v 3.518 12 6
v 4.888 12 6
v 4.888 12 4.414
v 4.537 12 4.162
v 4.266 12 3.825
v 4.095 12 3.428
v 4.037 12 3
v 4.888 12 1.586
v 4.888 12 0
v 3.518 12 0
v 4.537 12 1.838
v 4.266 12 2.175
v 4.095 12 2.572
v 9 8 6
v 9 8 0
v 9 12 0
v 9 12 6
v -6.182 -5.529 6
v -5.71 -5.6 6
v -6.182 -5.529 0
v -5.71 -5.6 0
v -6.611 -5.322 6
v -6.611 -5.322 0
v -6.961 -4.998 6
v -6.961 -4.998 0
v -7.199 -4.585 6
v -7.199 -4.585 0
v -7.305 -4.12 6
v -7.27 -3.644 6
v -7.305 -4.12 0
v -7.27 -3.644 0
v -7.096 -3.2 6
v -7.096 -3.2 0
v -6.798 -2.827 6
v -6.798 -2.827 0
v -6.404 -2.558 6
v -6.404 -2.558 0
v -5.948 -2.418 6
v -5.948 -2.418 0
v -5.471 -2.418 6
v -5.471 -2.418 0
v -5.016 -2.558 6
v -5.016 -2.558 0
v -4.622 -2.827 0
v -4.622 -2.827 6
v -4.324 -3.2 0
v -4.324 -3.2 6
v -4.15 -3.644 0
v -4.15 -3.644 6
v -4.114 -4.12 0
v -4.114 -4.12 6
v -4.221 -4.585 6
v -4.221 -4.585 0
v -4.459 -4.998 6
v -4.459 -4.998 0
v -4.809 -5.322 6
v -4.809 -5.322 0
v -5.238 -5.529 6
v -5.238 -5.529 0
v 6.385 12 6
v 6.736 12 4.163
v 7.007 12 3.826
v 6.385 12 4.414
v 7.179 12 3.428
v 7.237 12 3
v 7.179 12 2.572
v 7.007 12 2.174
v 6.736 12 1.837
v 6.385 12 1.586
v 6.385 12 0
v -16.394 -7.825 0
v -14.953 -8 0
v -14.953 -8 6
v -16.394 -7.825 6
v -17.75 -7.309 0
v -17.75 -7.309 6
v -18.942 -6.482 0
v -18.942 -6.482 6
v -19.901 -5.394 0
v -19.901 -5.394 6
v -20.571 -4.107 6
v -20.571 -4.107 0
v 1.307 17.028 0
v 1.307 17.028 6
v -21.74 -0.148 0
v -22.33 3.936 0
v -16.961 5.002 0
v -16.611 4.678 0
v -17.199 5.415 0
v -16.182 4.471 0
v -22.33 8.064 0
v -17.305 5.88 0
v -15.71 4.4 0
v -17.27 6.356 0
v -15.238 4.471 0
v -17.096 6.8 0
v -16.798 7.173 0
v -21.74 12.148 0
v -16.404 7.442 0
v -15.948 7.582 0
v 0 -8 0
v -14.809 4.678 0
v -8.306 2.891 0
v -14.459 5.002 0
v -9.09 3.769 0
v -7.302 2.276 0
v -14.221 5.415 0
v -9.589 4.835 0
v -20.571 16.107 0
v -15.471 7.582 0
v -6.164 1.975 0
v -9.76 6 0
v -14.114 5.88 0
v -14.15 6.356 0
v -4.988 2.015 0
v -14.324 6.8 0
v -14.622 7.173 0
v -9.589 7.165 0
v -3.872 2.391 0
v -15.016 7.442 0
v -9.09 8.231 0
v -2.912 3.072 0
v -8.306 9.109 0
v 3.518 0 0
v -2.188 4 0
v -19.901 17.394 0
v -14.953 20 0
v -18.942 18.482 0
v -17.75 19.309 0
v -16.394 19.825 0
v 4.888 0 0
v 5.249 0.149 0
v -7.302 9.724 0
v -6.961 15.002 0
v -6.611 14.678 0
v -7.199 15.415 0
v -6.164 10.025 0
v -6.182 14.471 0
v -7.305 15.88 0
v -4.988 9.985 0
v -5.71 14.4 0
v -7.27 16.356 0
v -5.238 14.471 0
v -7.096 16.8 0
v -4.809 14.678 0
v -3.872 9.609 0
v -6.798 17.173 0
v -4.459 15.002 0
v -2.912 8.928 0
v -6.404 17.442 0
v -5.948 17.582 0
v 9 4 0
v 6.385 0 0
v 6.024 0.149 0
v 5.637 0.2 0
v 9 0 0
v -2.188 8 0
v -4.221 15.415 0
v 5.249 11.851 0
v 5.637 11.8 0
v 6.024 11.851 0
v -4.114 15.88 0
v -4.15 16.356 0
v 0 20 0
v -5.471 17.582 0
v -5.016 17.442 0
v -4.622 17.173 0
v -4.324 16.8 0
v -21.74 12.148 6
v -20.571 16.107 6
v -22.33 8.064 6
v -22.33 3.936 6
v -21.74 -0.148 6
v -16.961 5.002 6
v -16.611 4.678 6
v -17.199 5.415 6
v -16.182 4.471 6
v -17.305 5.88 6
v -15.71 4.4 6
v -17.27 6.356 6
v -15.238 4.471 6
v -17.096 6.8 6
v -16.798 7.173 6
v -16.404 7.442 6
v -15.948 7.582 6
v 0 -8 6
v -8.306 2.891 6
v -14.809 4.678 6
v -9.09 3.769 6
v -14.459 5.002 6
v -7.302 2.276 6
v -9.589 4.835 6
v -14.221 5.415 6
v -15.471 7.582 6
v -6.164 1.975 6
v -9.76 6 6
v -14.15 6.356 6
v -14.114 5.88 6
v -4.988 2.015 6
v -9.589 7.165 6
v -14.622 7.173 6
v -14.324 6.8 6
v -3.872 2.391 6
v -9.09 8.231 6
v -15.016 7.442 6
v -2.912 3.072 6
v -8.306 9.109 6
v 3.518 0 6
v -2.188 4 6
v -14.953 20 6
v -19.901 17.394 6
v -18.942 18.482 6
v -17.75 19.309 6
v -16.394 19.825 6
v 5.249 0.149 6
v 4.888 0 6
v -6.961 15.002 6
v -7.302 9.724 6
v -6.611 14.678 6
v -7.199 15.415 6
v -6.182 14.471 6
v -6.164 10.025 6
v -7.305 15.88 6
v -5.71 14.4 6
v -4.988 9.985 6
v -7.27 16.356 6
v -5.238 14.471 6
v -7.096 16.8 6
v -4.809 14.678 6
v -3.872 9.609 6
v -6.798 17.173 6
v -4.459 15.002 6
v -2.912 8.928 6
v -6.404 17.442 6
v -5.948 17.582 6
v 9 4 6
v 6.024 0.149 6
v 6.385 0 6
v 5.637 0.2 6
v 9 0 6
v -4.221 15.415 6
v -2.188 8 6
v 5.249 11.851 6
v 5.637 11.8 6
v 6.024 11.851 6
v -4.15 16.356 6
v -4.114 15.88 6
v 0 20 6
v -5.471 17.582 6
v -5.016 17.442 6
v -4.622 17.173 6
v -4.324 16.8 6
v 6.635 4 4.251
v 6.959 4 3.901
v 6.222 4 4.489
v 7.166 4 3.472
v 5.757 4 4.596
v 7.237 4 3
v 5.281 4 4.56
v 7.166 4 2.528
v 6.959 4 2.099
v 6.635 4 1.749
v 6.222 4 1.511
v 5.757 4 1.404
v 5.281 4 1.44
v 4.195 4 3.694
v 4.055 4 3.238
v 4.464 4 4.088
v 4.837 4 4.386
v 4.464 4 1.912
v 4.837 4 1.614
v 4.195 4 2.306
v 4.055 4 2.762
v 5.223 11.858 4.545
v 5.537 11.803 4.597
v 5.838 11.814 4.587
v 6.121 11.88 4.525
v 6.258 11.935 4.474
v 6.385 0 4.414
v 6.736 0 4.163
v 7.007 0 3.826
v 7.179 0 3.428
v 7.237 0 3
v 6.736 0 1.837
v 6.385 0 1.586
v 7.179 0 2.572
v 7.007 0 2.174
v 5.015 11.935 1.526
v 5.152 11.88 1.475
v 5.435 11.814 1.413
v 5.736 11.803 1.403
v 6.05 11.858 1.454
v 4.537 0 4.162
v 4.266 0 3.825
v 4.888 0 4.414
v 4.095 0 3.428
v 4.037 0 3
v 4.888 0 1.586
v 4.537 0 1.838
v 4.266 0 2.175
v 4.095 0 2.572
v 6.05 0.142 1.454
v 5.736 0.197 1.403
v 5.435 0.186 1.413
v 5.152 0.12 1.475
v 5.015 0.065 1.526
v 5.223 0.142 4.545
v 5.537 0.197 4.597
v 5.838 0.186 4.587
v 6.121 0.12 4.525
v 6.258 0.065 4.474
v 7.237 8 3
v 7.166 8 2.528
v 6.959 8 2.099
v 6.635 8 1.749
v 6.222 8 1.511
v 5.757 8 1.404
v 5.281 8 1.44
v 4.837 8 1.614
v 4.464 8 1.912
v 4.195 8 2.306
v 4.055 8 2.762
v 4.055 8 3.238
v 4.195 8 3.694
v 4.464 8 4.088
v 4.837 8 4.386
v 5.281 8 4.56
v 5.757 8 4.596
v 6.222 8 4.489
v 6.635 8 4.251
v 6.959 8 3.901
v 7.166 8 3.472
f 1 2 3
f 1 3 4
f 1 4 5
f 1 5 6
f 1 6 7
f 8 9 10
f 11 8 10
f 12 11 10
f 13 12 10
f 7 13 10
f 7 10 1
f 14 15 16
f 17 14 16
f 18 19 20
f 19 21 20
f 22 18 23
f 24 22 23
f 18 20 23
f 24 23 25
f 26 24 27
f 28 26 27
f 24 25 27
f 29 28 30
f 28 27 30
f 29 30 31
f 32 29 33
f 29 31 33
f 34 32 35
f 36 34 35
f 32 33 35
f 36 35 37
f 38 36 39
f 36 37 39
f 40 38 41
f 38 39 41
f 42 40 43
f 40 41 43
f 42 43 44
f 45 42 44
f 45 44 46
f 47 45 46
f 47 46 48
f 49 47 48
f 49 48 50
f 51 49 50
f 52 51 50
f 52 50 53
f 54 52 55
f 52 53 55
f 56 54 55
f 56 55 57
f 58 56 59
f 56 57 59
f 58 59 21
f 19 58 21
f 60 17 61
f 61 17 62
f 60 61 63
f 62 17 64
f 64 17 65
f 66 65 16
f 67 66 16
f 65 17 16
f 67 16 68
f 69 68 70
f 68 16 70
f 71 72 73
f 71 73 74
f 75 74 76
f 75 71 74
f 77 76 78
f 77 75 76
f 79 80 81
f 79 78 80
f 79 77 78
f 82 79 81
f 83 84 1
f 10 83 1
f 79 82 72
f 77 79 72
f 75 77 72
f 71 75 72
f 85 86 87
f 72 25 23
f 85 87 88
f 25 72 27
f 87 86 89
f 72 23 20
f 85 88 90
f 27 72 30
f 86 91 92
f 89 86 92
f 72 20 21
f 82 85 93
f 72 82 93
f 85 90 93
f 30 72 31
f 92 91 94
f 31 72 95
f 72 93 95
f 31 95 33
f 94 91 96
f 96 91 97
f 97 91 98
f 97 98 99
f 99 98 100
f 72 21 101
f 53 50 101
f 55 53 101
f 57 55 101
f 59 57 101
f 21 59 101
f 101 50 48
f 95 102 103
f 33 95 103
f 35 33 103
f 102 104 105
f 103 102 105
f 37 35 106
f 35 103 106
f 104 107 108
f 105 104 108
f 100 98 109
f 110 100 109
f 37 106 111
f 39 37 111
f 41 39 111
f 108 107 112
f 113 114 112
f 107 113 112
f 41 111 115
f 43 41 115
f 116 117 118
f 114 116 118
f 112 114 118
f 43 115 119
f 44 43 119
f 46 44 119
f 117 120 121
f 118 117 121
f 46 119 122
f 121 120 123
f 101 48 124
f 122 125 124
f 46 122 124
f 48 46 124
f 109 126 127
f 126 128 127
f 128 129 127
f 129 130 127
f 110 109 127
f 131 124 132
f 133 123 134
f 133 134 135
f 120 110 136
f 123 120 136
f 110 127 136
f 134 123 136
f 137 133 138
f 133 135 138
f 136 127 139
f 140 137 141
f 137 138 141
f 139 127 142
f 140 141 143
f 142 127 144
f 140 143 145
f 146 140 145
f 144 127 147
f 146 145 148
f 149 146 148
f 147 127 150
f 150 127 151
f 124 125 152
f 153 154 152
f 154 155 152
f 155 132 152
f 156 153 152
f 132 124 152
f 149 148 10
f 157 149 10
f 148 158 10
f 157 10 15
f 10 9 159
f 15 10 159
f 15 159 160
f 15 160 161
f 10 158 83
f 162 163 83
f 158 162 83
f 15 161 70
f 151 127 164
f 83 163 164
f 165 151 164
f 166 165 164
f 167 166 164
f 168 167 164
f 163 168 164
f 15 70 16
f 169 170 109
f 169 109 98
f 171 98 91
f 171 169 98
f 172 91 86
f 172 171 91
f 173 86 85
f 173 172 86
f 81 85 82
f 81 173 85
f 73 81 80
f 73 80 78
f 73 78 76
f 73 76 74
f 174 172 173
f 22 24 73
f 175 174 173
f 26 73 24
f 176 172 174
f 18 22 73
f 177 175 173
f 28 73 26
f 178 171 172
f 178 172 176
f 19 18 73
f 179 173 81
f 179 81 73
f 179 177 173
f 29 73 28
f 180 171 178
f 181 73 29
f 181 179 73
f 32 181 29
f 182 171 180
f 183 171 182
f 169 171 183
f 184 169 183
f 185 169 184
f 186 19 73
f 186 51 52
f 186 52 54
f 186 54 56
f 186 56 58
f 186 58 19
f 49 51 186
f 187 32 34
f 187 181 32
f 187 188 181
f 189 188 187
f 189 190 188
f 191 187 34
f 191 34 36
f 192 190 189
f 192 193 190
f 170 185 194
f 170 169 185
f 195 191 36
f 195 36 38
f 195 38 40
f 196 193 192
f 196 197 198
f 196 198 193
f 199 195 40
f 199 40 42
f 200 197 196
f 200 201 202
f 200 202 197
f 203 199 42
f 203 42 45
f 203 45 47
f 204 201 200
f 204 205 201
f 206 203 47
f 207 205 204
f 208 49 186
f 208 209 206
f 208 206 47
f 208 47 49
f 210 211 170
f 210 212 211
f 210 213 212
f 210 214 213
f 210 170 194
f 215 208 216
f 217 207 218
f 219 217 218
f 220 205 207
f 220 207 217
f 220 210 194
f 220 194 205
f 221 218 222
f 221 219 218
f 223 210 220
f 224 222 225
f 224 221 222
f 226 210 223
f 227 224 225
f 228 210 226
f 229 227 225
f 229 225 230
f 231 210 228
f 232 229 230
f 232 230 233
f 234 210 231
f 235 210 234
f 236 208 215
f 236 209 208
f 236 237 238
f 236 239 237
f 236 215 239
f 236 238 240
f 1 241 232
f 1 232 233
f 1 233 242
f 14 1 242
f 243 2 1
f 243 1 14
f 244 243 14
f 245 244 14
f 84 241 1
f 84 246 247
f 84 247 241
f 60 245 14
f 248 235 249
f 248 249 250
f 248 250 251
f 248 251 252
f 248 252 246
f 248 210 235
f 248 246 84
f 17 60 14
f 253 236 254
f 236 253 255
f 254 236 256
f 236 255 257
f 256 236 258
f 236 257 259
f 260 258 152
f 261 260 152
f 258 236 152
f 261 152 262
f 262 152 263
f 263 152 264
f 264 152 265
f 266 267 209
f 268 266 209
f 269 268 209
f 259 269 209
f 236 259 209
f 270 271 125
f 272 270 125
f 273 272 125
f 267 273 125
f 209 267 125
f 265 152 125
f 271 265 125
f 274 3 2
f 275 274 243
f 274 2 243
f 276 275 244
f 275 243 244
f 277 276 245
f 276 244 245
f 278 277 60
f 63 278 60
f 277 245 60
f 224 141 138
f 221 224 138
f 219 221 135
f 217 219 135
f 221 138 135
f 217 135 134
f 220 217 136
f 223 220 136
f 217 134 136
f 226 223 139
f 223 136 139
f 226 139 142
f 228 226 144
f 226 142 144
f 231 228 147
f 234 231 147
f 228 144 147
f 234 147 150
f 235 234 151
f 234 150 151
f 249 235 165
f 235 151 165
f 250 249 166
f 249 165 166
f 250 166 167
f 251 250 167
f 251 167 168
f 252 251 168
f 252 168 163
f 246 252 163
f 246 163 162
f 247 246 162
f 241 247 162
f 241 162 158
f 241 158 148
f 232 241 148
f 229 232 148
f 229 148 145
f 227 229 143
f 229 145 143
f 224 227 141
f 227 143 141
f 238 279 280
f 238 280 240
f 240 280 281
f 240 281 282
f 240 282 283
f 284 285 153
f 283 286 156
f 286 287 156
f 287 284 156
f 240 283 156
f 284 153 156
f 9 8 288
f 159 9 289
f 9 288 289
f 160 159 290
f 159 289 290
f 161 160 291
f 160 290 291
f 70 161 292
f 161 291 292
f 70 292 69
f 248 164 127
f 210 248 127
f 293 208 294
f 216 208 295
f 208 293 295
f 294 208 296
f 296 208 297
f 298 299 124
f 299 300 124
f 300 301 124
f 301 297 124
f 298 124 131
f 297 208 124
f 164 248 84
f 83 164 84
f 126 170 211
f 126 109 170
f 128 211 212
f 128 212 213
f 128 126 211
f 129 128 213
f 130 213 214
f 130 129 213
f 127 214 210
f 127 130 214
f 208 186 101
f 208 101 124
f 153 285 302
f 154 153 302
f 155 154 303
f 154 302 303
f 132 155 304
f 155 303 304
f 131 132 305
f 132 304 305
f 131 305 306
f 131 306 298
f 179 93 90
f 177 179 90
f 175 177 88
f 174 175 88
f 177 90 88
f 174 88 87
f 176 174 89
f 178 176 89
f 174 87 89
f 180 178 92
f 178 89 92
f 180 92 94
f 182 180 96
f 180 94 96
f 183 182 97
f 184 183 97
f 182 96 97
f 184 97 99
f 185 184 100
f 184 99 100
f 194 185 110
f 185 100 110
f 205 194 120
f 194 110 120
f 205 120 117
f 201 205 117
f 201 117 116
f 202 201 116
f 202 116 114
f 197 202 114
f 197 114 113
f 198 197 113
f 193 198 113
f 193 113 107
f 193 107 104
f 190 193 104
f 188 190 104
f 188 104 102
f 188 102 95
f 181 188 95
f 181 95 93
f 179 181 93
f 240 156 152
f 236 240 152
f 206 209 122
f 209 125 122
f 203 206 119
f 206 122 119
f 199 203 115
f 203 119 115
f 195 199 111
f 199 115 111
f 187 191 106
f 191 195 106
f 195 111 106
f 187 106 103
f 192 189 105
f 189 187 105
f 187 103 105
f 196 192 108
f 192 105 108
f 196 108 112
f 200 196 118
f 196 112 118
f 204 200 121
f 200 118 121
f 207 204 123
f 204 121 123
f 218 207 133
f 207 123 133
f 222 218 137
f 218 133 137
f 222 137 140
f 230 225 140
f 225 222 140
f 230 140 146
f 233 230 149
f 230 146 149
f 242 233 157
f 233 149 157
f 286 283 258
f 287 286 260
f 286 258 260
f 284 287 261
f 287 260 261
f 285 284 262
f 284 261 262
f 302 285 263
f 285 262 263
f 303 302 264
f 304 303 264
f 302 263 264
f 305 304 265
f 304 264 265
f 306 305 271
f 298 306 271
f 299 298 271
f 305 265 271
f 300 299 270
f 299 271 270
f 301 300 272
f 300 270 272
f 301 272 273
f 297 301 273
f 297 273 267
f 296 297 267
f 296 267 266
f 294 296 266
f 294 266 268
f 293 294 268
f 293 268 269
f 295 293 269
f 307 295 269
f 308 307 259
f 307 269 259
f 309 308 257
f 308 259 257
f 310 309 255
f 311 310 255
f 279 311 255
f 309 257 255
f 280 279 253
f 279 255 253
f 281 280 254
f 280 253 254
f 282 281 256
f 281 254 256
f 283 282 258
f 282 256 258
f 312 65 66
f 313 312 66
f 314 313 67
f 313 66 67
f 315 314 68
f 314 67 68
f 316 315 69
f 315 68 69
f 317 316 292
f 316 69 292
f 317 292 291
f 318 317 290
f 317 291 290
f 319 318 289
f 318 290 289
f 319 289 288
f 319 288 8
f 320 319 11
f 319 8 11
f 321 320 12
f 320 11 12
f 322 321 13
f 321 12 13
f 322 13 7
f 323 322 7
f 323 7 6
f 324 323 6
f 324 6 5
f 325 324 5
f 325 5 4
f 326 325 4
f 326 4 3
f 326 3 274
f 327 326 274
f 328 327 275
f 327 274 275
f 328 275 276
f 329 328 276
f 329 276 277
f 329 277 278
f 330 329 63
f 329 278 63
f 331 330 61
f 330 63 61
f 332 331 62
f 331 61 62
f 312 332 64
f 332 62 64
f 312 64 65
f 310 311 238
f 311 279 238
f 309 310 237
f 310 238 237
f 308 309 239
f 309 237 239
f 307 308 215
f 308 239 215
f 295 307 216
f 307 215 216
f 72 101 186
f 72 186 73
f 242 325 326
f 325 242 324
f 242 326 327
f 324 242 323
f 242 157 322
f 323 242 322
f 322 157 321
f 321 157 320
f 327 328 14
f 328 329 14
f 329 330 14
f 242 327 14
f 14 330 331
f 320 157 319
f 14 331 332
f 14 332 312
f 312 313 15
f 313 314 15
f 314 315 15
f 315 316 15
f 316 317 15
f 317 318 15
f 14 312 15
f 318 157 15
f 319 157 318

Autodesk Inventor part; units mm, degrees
ref_plane "YZ Plane" through (0, 0, 0) normal (1, 0, 0) x (0, 1, 0)
ref_plane "XZ Plane" through (0, 0, 0) normal (0, 1, 0) x (-1, 0, 0)
ref_plane "XY Plane" through (0, 0, 0) normal (0, 0, 1) x (1, 0, 0)
sketch "スケッチ1" plane through (0, 0, 0) normal (0, 0, 1) x (1, 0, 0)
  line L0 (9, 0) -> (9, 4)
  line L1 (9, 12) -> (2.2731, 12)
  line L2 (0, 8) -> (9, 8)
  line L3 (0, 4) -> (9, 4)
  line L4 (9, 8) -> (9, 12)
  line L5 (2.2731, 12) -> (0, 14.2779)
  line L6 (2.2731, 0) -> (-5.7099, -8)
  line L7 (-5.7099, 20) -> (-15.7099, 20)
  line L8 (-5.7099, -8) -> (-15.7099, -8)
  line L9 (-15.7099, 20) -> (-25.7698, 20)
  line L10 (-25.7698, 20) -> (-25.7698, -8)
  line L11 (-25.7698, -8) -> (-15.7099, -8)
  line L12 (2.2731, 0) -> (9, 0)
  line L13 (0, 14.2779) -> (-5.7099, 20)
  arc A0 (-2.1881, 8) -> (-2.1881, 4) centre (-5.7099, 6) ccw
  line L14 (0, 8) -> (-2.1881, 8)
  line L15 (0, 4) -> (-2.1881, 4)
  point P0 (0, 0)
  point P1 (4.5, 12)
  point P2 (4.5, 0)
  point P3 (4.5, 4)
  point P4 (-25.7099, 6)
  dimension "d5" = 4
  dimension "d8" = 10
  dimension "d9" = 10
  dimension "d12" = 14
  dimension "d90" = 8.1
extrude "押し出し1" add sketch "スケッチ1" along normal blind 6
sketch "スケッチ2" plane through (0, 0, 6) normal (0, 0, 1) x (1, 0, 0)
  circle A0 centre (5.6365, 13.3) radius 1.5
  line L0 (9, 8) -> (9, 12) projected
  line L1 (11.5477, 6) -> (-28.1936, 6) construction
  line L2 (9, 12) -> (2.2731, 12) projected
  circle A1 centre (5.6365, -1.3) radius 1.5
  point P0 (0, 0)
  point P1 (4.8882, 12)
  point P2 (6.3849, 12)
  dimension "d15" = 3
  dimension "d16" = 3.3635
  dimension "d17" = 1.3
extrude "押し出し2" cut sketch "スケッチ2" against normal blind 6 contours A0 L2 | A1 picked at (5.4614, 13.0013)
sketch "スケッチ3" plane through (0, 0, 6) normal (0, 0, 1) x (1, 0, 0)
  circle A0 centre (5.6365, 13.3) radius 1.5
  line L0 (9, 12) -> (2.2731, 12) projected
  point P0 (0, 0)
  point P1 (4.8882, 12)
  point P2 (6.3849, 12)
  dimension "d20" = 3
  dimension "d21" = 1.3
extrude "押し出し3" add sketch "スケッチ3" against normal blind 6 contours A0 L0 picked at (5.4614, 13.0013)
sketch "スケッチ4" plane through (0, 0, 6) normal (0, 0, 1) x (1, 0, 0)
  arc A0 (6.3849, 12) -> (4.8882, 12) centre (5.6365, 13.3) ccw projected
  circle A1 centre (5.6365, 13.3) radius 1.5
  point P0 (0, 0)
  dimension "d24" = 3
extrude "押し出し4" cut sketch "スケッチ4" against normal blind 6
fillet "フィレット1" radius 5 1 edges at (-25.7698, 20, 3)
fillet "フィレット2" radius 5 1 edges at (-25.7698, -8, 3)
fillet "フィレット3" radius 3 4 edges at (-5.7099, -8, 3) (2.2731, 0, 3) (-5.7099, 20, 3) (2.2731, 12, 3)
sketch "スケッチ6" plane through (0, 4, 0) normal (0, 1, 0) x (1, 0, 0)
  point P0 (0, 0)
sketch "スケッチ7" plane through (4.8882, 12, 6) normal (0, 1, 0) x (1, 0, 0)
  circle A0 centre (0.7488, 3) radius 1.6
  line L0 (1.4967, 0) -> (0, 0) projected
  line L1 (4.1118, 6) -> (4.1118, 0) projected
  point P0 (-4.8882, 6)
  point P1 (0.7483, 0)
  dimension "d43" = 3.2
  dimension "d44" = 3
  dimension "d45" = 3.363
extrude "押し出し5" cut sketch "スケッチ7" against normal blind 28
sketch "スケッチ11" plane through (0, 0, 6) normal (0, 0, 1) x (1, 0, 0)
  line L0 (-6.9544, 20) -> (-20.7698, 20) projected
  line L1 (-20.7698, 20) -> (-6.9544, 20)
  arc A0 (1.394, 12.8809) -> (3.5176, 12) centre (3.5176, 15) ccw projected
  line L2 (0, 20) -> (1.3068, 17.0279)
  arc A1 (1.394, 12.8809) -> (3.5176, 12) centre (3.5176, 15) ccw
  arc A2 (-4.8308, 19.1191) -> (-6.9544, 20) centre (-6.9544, 17) ccw projected
  arc A3 (-4.8308, 19.1191) -> (-6.9544, 20) centre (-6.9544, 17) ccw
  line L3 (1.394, 12.8809) -> (-4.8308, 19.1191) projected
  line L4 (-4.8308, 19.1191) -> (1.394, 12.8809)
  arc A4 (0, 8) -> (0, 4) centre (-5.7099, 6) ccw projected
  line L5 (-11.7599, 6) -> (12.1155, 6) construction
  line L6 (-20.7698, -8) -> (0, -8)
  line L7 (0, -8) -> (3.5176, 0)
  arc A5 (-6.9544, -8) -> (-4.8308, -7.1191) centre (-6.9544, -5) ccw
  line L8 (1.394, -0.8809) -> (-4.8308, -7.1191)
  line L9 (-6.9544, 20) -> (0, 20)
  line L10 (1.3068, 17.0279) -> (3.5176, 12)
  arc A6 (3.5176, 0) -> (1.394, -0.8809) centre (3.5176, -3) ccw
  point P0 (0, 0)
extrude "押し出し6" add sketch "スケッチ11" against normal blind 6
sketch "スケッチ12" plane through (0, 0, 6) normal (0, 0, 1) x (1, 0, 0)
  arc A0 (0, 8) -> (0, 4) centre (-5.7099, 6) ccw projected
  point P0 (0, 0)
  point P1 (-15.7099, 6)
  point P2 (-5.7099, 16)
  point P3 (-5.7099, -4)
  dimension "d74" = 10
  dimension "d76" = 10
  dimension "d77" = 10
hole "穴4" at (-15.7099, 6, 6) at (-5.7099, 16, 6) at (-5.7099, -4, 6) direction (0, 0, -1) diameter 3.2 end through all
sketch "スケッチ13" plane through (0, 0, 6) normal (0, 0, 1) x (1, 0, 0)
  line L0 (-20.7698, -8) -> (0, -8) projected
  line L1 (0, 20) -> (-20.7698, 20) projected
  line L2 (-18.7698, 20) -> (-18.7698, -8) construction
  line L3 (-25.7698, 15) -> (-25.7698, -3) projected
  arc A0 (-18.7698, 20) -> (-18.7698, -8) centre (6.3784, 6) ccw
  line L4 (-18.7698, 20) -> (-29.3351, 20)
  line L5 (-29.3351, 20) -> (-29.3351, -8)
  line L6 (-29.3351, -8) -> (-18.7698, -8)
  point P0 (0, 0)
  dimension "d85" = 7
extrude "押し出し7" cut sketch "スケッチ13" against normal blind 6
fillet "フィレット4" radius 6 1 edges at (-18.7698, 20, 3)
fillet "フィレット5" radius 6 1 edges at (-18.7698, -8, 3)
properties part number "射出_腕固定2_真" material "ポリカーボネート、クリア"
